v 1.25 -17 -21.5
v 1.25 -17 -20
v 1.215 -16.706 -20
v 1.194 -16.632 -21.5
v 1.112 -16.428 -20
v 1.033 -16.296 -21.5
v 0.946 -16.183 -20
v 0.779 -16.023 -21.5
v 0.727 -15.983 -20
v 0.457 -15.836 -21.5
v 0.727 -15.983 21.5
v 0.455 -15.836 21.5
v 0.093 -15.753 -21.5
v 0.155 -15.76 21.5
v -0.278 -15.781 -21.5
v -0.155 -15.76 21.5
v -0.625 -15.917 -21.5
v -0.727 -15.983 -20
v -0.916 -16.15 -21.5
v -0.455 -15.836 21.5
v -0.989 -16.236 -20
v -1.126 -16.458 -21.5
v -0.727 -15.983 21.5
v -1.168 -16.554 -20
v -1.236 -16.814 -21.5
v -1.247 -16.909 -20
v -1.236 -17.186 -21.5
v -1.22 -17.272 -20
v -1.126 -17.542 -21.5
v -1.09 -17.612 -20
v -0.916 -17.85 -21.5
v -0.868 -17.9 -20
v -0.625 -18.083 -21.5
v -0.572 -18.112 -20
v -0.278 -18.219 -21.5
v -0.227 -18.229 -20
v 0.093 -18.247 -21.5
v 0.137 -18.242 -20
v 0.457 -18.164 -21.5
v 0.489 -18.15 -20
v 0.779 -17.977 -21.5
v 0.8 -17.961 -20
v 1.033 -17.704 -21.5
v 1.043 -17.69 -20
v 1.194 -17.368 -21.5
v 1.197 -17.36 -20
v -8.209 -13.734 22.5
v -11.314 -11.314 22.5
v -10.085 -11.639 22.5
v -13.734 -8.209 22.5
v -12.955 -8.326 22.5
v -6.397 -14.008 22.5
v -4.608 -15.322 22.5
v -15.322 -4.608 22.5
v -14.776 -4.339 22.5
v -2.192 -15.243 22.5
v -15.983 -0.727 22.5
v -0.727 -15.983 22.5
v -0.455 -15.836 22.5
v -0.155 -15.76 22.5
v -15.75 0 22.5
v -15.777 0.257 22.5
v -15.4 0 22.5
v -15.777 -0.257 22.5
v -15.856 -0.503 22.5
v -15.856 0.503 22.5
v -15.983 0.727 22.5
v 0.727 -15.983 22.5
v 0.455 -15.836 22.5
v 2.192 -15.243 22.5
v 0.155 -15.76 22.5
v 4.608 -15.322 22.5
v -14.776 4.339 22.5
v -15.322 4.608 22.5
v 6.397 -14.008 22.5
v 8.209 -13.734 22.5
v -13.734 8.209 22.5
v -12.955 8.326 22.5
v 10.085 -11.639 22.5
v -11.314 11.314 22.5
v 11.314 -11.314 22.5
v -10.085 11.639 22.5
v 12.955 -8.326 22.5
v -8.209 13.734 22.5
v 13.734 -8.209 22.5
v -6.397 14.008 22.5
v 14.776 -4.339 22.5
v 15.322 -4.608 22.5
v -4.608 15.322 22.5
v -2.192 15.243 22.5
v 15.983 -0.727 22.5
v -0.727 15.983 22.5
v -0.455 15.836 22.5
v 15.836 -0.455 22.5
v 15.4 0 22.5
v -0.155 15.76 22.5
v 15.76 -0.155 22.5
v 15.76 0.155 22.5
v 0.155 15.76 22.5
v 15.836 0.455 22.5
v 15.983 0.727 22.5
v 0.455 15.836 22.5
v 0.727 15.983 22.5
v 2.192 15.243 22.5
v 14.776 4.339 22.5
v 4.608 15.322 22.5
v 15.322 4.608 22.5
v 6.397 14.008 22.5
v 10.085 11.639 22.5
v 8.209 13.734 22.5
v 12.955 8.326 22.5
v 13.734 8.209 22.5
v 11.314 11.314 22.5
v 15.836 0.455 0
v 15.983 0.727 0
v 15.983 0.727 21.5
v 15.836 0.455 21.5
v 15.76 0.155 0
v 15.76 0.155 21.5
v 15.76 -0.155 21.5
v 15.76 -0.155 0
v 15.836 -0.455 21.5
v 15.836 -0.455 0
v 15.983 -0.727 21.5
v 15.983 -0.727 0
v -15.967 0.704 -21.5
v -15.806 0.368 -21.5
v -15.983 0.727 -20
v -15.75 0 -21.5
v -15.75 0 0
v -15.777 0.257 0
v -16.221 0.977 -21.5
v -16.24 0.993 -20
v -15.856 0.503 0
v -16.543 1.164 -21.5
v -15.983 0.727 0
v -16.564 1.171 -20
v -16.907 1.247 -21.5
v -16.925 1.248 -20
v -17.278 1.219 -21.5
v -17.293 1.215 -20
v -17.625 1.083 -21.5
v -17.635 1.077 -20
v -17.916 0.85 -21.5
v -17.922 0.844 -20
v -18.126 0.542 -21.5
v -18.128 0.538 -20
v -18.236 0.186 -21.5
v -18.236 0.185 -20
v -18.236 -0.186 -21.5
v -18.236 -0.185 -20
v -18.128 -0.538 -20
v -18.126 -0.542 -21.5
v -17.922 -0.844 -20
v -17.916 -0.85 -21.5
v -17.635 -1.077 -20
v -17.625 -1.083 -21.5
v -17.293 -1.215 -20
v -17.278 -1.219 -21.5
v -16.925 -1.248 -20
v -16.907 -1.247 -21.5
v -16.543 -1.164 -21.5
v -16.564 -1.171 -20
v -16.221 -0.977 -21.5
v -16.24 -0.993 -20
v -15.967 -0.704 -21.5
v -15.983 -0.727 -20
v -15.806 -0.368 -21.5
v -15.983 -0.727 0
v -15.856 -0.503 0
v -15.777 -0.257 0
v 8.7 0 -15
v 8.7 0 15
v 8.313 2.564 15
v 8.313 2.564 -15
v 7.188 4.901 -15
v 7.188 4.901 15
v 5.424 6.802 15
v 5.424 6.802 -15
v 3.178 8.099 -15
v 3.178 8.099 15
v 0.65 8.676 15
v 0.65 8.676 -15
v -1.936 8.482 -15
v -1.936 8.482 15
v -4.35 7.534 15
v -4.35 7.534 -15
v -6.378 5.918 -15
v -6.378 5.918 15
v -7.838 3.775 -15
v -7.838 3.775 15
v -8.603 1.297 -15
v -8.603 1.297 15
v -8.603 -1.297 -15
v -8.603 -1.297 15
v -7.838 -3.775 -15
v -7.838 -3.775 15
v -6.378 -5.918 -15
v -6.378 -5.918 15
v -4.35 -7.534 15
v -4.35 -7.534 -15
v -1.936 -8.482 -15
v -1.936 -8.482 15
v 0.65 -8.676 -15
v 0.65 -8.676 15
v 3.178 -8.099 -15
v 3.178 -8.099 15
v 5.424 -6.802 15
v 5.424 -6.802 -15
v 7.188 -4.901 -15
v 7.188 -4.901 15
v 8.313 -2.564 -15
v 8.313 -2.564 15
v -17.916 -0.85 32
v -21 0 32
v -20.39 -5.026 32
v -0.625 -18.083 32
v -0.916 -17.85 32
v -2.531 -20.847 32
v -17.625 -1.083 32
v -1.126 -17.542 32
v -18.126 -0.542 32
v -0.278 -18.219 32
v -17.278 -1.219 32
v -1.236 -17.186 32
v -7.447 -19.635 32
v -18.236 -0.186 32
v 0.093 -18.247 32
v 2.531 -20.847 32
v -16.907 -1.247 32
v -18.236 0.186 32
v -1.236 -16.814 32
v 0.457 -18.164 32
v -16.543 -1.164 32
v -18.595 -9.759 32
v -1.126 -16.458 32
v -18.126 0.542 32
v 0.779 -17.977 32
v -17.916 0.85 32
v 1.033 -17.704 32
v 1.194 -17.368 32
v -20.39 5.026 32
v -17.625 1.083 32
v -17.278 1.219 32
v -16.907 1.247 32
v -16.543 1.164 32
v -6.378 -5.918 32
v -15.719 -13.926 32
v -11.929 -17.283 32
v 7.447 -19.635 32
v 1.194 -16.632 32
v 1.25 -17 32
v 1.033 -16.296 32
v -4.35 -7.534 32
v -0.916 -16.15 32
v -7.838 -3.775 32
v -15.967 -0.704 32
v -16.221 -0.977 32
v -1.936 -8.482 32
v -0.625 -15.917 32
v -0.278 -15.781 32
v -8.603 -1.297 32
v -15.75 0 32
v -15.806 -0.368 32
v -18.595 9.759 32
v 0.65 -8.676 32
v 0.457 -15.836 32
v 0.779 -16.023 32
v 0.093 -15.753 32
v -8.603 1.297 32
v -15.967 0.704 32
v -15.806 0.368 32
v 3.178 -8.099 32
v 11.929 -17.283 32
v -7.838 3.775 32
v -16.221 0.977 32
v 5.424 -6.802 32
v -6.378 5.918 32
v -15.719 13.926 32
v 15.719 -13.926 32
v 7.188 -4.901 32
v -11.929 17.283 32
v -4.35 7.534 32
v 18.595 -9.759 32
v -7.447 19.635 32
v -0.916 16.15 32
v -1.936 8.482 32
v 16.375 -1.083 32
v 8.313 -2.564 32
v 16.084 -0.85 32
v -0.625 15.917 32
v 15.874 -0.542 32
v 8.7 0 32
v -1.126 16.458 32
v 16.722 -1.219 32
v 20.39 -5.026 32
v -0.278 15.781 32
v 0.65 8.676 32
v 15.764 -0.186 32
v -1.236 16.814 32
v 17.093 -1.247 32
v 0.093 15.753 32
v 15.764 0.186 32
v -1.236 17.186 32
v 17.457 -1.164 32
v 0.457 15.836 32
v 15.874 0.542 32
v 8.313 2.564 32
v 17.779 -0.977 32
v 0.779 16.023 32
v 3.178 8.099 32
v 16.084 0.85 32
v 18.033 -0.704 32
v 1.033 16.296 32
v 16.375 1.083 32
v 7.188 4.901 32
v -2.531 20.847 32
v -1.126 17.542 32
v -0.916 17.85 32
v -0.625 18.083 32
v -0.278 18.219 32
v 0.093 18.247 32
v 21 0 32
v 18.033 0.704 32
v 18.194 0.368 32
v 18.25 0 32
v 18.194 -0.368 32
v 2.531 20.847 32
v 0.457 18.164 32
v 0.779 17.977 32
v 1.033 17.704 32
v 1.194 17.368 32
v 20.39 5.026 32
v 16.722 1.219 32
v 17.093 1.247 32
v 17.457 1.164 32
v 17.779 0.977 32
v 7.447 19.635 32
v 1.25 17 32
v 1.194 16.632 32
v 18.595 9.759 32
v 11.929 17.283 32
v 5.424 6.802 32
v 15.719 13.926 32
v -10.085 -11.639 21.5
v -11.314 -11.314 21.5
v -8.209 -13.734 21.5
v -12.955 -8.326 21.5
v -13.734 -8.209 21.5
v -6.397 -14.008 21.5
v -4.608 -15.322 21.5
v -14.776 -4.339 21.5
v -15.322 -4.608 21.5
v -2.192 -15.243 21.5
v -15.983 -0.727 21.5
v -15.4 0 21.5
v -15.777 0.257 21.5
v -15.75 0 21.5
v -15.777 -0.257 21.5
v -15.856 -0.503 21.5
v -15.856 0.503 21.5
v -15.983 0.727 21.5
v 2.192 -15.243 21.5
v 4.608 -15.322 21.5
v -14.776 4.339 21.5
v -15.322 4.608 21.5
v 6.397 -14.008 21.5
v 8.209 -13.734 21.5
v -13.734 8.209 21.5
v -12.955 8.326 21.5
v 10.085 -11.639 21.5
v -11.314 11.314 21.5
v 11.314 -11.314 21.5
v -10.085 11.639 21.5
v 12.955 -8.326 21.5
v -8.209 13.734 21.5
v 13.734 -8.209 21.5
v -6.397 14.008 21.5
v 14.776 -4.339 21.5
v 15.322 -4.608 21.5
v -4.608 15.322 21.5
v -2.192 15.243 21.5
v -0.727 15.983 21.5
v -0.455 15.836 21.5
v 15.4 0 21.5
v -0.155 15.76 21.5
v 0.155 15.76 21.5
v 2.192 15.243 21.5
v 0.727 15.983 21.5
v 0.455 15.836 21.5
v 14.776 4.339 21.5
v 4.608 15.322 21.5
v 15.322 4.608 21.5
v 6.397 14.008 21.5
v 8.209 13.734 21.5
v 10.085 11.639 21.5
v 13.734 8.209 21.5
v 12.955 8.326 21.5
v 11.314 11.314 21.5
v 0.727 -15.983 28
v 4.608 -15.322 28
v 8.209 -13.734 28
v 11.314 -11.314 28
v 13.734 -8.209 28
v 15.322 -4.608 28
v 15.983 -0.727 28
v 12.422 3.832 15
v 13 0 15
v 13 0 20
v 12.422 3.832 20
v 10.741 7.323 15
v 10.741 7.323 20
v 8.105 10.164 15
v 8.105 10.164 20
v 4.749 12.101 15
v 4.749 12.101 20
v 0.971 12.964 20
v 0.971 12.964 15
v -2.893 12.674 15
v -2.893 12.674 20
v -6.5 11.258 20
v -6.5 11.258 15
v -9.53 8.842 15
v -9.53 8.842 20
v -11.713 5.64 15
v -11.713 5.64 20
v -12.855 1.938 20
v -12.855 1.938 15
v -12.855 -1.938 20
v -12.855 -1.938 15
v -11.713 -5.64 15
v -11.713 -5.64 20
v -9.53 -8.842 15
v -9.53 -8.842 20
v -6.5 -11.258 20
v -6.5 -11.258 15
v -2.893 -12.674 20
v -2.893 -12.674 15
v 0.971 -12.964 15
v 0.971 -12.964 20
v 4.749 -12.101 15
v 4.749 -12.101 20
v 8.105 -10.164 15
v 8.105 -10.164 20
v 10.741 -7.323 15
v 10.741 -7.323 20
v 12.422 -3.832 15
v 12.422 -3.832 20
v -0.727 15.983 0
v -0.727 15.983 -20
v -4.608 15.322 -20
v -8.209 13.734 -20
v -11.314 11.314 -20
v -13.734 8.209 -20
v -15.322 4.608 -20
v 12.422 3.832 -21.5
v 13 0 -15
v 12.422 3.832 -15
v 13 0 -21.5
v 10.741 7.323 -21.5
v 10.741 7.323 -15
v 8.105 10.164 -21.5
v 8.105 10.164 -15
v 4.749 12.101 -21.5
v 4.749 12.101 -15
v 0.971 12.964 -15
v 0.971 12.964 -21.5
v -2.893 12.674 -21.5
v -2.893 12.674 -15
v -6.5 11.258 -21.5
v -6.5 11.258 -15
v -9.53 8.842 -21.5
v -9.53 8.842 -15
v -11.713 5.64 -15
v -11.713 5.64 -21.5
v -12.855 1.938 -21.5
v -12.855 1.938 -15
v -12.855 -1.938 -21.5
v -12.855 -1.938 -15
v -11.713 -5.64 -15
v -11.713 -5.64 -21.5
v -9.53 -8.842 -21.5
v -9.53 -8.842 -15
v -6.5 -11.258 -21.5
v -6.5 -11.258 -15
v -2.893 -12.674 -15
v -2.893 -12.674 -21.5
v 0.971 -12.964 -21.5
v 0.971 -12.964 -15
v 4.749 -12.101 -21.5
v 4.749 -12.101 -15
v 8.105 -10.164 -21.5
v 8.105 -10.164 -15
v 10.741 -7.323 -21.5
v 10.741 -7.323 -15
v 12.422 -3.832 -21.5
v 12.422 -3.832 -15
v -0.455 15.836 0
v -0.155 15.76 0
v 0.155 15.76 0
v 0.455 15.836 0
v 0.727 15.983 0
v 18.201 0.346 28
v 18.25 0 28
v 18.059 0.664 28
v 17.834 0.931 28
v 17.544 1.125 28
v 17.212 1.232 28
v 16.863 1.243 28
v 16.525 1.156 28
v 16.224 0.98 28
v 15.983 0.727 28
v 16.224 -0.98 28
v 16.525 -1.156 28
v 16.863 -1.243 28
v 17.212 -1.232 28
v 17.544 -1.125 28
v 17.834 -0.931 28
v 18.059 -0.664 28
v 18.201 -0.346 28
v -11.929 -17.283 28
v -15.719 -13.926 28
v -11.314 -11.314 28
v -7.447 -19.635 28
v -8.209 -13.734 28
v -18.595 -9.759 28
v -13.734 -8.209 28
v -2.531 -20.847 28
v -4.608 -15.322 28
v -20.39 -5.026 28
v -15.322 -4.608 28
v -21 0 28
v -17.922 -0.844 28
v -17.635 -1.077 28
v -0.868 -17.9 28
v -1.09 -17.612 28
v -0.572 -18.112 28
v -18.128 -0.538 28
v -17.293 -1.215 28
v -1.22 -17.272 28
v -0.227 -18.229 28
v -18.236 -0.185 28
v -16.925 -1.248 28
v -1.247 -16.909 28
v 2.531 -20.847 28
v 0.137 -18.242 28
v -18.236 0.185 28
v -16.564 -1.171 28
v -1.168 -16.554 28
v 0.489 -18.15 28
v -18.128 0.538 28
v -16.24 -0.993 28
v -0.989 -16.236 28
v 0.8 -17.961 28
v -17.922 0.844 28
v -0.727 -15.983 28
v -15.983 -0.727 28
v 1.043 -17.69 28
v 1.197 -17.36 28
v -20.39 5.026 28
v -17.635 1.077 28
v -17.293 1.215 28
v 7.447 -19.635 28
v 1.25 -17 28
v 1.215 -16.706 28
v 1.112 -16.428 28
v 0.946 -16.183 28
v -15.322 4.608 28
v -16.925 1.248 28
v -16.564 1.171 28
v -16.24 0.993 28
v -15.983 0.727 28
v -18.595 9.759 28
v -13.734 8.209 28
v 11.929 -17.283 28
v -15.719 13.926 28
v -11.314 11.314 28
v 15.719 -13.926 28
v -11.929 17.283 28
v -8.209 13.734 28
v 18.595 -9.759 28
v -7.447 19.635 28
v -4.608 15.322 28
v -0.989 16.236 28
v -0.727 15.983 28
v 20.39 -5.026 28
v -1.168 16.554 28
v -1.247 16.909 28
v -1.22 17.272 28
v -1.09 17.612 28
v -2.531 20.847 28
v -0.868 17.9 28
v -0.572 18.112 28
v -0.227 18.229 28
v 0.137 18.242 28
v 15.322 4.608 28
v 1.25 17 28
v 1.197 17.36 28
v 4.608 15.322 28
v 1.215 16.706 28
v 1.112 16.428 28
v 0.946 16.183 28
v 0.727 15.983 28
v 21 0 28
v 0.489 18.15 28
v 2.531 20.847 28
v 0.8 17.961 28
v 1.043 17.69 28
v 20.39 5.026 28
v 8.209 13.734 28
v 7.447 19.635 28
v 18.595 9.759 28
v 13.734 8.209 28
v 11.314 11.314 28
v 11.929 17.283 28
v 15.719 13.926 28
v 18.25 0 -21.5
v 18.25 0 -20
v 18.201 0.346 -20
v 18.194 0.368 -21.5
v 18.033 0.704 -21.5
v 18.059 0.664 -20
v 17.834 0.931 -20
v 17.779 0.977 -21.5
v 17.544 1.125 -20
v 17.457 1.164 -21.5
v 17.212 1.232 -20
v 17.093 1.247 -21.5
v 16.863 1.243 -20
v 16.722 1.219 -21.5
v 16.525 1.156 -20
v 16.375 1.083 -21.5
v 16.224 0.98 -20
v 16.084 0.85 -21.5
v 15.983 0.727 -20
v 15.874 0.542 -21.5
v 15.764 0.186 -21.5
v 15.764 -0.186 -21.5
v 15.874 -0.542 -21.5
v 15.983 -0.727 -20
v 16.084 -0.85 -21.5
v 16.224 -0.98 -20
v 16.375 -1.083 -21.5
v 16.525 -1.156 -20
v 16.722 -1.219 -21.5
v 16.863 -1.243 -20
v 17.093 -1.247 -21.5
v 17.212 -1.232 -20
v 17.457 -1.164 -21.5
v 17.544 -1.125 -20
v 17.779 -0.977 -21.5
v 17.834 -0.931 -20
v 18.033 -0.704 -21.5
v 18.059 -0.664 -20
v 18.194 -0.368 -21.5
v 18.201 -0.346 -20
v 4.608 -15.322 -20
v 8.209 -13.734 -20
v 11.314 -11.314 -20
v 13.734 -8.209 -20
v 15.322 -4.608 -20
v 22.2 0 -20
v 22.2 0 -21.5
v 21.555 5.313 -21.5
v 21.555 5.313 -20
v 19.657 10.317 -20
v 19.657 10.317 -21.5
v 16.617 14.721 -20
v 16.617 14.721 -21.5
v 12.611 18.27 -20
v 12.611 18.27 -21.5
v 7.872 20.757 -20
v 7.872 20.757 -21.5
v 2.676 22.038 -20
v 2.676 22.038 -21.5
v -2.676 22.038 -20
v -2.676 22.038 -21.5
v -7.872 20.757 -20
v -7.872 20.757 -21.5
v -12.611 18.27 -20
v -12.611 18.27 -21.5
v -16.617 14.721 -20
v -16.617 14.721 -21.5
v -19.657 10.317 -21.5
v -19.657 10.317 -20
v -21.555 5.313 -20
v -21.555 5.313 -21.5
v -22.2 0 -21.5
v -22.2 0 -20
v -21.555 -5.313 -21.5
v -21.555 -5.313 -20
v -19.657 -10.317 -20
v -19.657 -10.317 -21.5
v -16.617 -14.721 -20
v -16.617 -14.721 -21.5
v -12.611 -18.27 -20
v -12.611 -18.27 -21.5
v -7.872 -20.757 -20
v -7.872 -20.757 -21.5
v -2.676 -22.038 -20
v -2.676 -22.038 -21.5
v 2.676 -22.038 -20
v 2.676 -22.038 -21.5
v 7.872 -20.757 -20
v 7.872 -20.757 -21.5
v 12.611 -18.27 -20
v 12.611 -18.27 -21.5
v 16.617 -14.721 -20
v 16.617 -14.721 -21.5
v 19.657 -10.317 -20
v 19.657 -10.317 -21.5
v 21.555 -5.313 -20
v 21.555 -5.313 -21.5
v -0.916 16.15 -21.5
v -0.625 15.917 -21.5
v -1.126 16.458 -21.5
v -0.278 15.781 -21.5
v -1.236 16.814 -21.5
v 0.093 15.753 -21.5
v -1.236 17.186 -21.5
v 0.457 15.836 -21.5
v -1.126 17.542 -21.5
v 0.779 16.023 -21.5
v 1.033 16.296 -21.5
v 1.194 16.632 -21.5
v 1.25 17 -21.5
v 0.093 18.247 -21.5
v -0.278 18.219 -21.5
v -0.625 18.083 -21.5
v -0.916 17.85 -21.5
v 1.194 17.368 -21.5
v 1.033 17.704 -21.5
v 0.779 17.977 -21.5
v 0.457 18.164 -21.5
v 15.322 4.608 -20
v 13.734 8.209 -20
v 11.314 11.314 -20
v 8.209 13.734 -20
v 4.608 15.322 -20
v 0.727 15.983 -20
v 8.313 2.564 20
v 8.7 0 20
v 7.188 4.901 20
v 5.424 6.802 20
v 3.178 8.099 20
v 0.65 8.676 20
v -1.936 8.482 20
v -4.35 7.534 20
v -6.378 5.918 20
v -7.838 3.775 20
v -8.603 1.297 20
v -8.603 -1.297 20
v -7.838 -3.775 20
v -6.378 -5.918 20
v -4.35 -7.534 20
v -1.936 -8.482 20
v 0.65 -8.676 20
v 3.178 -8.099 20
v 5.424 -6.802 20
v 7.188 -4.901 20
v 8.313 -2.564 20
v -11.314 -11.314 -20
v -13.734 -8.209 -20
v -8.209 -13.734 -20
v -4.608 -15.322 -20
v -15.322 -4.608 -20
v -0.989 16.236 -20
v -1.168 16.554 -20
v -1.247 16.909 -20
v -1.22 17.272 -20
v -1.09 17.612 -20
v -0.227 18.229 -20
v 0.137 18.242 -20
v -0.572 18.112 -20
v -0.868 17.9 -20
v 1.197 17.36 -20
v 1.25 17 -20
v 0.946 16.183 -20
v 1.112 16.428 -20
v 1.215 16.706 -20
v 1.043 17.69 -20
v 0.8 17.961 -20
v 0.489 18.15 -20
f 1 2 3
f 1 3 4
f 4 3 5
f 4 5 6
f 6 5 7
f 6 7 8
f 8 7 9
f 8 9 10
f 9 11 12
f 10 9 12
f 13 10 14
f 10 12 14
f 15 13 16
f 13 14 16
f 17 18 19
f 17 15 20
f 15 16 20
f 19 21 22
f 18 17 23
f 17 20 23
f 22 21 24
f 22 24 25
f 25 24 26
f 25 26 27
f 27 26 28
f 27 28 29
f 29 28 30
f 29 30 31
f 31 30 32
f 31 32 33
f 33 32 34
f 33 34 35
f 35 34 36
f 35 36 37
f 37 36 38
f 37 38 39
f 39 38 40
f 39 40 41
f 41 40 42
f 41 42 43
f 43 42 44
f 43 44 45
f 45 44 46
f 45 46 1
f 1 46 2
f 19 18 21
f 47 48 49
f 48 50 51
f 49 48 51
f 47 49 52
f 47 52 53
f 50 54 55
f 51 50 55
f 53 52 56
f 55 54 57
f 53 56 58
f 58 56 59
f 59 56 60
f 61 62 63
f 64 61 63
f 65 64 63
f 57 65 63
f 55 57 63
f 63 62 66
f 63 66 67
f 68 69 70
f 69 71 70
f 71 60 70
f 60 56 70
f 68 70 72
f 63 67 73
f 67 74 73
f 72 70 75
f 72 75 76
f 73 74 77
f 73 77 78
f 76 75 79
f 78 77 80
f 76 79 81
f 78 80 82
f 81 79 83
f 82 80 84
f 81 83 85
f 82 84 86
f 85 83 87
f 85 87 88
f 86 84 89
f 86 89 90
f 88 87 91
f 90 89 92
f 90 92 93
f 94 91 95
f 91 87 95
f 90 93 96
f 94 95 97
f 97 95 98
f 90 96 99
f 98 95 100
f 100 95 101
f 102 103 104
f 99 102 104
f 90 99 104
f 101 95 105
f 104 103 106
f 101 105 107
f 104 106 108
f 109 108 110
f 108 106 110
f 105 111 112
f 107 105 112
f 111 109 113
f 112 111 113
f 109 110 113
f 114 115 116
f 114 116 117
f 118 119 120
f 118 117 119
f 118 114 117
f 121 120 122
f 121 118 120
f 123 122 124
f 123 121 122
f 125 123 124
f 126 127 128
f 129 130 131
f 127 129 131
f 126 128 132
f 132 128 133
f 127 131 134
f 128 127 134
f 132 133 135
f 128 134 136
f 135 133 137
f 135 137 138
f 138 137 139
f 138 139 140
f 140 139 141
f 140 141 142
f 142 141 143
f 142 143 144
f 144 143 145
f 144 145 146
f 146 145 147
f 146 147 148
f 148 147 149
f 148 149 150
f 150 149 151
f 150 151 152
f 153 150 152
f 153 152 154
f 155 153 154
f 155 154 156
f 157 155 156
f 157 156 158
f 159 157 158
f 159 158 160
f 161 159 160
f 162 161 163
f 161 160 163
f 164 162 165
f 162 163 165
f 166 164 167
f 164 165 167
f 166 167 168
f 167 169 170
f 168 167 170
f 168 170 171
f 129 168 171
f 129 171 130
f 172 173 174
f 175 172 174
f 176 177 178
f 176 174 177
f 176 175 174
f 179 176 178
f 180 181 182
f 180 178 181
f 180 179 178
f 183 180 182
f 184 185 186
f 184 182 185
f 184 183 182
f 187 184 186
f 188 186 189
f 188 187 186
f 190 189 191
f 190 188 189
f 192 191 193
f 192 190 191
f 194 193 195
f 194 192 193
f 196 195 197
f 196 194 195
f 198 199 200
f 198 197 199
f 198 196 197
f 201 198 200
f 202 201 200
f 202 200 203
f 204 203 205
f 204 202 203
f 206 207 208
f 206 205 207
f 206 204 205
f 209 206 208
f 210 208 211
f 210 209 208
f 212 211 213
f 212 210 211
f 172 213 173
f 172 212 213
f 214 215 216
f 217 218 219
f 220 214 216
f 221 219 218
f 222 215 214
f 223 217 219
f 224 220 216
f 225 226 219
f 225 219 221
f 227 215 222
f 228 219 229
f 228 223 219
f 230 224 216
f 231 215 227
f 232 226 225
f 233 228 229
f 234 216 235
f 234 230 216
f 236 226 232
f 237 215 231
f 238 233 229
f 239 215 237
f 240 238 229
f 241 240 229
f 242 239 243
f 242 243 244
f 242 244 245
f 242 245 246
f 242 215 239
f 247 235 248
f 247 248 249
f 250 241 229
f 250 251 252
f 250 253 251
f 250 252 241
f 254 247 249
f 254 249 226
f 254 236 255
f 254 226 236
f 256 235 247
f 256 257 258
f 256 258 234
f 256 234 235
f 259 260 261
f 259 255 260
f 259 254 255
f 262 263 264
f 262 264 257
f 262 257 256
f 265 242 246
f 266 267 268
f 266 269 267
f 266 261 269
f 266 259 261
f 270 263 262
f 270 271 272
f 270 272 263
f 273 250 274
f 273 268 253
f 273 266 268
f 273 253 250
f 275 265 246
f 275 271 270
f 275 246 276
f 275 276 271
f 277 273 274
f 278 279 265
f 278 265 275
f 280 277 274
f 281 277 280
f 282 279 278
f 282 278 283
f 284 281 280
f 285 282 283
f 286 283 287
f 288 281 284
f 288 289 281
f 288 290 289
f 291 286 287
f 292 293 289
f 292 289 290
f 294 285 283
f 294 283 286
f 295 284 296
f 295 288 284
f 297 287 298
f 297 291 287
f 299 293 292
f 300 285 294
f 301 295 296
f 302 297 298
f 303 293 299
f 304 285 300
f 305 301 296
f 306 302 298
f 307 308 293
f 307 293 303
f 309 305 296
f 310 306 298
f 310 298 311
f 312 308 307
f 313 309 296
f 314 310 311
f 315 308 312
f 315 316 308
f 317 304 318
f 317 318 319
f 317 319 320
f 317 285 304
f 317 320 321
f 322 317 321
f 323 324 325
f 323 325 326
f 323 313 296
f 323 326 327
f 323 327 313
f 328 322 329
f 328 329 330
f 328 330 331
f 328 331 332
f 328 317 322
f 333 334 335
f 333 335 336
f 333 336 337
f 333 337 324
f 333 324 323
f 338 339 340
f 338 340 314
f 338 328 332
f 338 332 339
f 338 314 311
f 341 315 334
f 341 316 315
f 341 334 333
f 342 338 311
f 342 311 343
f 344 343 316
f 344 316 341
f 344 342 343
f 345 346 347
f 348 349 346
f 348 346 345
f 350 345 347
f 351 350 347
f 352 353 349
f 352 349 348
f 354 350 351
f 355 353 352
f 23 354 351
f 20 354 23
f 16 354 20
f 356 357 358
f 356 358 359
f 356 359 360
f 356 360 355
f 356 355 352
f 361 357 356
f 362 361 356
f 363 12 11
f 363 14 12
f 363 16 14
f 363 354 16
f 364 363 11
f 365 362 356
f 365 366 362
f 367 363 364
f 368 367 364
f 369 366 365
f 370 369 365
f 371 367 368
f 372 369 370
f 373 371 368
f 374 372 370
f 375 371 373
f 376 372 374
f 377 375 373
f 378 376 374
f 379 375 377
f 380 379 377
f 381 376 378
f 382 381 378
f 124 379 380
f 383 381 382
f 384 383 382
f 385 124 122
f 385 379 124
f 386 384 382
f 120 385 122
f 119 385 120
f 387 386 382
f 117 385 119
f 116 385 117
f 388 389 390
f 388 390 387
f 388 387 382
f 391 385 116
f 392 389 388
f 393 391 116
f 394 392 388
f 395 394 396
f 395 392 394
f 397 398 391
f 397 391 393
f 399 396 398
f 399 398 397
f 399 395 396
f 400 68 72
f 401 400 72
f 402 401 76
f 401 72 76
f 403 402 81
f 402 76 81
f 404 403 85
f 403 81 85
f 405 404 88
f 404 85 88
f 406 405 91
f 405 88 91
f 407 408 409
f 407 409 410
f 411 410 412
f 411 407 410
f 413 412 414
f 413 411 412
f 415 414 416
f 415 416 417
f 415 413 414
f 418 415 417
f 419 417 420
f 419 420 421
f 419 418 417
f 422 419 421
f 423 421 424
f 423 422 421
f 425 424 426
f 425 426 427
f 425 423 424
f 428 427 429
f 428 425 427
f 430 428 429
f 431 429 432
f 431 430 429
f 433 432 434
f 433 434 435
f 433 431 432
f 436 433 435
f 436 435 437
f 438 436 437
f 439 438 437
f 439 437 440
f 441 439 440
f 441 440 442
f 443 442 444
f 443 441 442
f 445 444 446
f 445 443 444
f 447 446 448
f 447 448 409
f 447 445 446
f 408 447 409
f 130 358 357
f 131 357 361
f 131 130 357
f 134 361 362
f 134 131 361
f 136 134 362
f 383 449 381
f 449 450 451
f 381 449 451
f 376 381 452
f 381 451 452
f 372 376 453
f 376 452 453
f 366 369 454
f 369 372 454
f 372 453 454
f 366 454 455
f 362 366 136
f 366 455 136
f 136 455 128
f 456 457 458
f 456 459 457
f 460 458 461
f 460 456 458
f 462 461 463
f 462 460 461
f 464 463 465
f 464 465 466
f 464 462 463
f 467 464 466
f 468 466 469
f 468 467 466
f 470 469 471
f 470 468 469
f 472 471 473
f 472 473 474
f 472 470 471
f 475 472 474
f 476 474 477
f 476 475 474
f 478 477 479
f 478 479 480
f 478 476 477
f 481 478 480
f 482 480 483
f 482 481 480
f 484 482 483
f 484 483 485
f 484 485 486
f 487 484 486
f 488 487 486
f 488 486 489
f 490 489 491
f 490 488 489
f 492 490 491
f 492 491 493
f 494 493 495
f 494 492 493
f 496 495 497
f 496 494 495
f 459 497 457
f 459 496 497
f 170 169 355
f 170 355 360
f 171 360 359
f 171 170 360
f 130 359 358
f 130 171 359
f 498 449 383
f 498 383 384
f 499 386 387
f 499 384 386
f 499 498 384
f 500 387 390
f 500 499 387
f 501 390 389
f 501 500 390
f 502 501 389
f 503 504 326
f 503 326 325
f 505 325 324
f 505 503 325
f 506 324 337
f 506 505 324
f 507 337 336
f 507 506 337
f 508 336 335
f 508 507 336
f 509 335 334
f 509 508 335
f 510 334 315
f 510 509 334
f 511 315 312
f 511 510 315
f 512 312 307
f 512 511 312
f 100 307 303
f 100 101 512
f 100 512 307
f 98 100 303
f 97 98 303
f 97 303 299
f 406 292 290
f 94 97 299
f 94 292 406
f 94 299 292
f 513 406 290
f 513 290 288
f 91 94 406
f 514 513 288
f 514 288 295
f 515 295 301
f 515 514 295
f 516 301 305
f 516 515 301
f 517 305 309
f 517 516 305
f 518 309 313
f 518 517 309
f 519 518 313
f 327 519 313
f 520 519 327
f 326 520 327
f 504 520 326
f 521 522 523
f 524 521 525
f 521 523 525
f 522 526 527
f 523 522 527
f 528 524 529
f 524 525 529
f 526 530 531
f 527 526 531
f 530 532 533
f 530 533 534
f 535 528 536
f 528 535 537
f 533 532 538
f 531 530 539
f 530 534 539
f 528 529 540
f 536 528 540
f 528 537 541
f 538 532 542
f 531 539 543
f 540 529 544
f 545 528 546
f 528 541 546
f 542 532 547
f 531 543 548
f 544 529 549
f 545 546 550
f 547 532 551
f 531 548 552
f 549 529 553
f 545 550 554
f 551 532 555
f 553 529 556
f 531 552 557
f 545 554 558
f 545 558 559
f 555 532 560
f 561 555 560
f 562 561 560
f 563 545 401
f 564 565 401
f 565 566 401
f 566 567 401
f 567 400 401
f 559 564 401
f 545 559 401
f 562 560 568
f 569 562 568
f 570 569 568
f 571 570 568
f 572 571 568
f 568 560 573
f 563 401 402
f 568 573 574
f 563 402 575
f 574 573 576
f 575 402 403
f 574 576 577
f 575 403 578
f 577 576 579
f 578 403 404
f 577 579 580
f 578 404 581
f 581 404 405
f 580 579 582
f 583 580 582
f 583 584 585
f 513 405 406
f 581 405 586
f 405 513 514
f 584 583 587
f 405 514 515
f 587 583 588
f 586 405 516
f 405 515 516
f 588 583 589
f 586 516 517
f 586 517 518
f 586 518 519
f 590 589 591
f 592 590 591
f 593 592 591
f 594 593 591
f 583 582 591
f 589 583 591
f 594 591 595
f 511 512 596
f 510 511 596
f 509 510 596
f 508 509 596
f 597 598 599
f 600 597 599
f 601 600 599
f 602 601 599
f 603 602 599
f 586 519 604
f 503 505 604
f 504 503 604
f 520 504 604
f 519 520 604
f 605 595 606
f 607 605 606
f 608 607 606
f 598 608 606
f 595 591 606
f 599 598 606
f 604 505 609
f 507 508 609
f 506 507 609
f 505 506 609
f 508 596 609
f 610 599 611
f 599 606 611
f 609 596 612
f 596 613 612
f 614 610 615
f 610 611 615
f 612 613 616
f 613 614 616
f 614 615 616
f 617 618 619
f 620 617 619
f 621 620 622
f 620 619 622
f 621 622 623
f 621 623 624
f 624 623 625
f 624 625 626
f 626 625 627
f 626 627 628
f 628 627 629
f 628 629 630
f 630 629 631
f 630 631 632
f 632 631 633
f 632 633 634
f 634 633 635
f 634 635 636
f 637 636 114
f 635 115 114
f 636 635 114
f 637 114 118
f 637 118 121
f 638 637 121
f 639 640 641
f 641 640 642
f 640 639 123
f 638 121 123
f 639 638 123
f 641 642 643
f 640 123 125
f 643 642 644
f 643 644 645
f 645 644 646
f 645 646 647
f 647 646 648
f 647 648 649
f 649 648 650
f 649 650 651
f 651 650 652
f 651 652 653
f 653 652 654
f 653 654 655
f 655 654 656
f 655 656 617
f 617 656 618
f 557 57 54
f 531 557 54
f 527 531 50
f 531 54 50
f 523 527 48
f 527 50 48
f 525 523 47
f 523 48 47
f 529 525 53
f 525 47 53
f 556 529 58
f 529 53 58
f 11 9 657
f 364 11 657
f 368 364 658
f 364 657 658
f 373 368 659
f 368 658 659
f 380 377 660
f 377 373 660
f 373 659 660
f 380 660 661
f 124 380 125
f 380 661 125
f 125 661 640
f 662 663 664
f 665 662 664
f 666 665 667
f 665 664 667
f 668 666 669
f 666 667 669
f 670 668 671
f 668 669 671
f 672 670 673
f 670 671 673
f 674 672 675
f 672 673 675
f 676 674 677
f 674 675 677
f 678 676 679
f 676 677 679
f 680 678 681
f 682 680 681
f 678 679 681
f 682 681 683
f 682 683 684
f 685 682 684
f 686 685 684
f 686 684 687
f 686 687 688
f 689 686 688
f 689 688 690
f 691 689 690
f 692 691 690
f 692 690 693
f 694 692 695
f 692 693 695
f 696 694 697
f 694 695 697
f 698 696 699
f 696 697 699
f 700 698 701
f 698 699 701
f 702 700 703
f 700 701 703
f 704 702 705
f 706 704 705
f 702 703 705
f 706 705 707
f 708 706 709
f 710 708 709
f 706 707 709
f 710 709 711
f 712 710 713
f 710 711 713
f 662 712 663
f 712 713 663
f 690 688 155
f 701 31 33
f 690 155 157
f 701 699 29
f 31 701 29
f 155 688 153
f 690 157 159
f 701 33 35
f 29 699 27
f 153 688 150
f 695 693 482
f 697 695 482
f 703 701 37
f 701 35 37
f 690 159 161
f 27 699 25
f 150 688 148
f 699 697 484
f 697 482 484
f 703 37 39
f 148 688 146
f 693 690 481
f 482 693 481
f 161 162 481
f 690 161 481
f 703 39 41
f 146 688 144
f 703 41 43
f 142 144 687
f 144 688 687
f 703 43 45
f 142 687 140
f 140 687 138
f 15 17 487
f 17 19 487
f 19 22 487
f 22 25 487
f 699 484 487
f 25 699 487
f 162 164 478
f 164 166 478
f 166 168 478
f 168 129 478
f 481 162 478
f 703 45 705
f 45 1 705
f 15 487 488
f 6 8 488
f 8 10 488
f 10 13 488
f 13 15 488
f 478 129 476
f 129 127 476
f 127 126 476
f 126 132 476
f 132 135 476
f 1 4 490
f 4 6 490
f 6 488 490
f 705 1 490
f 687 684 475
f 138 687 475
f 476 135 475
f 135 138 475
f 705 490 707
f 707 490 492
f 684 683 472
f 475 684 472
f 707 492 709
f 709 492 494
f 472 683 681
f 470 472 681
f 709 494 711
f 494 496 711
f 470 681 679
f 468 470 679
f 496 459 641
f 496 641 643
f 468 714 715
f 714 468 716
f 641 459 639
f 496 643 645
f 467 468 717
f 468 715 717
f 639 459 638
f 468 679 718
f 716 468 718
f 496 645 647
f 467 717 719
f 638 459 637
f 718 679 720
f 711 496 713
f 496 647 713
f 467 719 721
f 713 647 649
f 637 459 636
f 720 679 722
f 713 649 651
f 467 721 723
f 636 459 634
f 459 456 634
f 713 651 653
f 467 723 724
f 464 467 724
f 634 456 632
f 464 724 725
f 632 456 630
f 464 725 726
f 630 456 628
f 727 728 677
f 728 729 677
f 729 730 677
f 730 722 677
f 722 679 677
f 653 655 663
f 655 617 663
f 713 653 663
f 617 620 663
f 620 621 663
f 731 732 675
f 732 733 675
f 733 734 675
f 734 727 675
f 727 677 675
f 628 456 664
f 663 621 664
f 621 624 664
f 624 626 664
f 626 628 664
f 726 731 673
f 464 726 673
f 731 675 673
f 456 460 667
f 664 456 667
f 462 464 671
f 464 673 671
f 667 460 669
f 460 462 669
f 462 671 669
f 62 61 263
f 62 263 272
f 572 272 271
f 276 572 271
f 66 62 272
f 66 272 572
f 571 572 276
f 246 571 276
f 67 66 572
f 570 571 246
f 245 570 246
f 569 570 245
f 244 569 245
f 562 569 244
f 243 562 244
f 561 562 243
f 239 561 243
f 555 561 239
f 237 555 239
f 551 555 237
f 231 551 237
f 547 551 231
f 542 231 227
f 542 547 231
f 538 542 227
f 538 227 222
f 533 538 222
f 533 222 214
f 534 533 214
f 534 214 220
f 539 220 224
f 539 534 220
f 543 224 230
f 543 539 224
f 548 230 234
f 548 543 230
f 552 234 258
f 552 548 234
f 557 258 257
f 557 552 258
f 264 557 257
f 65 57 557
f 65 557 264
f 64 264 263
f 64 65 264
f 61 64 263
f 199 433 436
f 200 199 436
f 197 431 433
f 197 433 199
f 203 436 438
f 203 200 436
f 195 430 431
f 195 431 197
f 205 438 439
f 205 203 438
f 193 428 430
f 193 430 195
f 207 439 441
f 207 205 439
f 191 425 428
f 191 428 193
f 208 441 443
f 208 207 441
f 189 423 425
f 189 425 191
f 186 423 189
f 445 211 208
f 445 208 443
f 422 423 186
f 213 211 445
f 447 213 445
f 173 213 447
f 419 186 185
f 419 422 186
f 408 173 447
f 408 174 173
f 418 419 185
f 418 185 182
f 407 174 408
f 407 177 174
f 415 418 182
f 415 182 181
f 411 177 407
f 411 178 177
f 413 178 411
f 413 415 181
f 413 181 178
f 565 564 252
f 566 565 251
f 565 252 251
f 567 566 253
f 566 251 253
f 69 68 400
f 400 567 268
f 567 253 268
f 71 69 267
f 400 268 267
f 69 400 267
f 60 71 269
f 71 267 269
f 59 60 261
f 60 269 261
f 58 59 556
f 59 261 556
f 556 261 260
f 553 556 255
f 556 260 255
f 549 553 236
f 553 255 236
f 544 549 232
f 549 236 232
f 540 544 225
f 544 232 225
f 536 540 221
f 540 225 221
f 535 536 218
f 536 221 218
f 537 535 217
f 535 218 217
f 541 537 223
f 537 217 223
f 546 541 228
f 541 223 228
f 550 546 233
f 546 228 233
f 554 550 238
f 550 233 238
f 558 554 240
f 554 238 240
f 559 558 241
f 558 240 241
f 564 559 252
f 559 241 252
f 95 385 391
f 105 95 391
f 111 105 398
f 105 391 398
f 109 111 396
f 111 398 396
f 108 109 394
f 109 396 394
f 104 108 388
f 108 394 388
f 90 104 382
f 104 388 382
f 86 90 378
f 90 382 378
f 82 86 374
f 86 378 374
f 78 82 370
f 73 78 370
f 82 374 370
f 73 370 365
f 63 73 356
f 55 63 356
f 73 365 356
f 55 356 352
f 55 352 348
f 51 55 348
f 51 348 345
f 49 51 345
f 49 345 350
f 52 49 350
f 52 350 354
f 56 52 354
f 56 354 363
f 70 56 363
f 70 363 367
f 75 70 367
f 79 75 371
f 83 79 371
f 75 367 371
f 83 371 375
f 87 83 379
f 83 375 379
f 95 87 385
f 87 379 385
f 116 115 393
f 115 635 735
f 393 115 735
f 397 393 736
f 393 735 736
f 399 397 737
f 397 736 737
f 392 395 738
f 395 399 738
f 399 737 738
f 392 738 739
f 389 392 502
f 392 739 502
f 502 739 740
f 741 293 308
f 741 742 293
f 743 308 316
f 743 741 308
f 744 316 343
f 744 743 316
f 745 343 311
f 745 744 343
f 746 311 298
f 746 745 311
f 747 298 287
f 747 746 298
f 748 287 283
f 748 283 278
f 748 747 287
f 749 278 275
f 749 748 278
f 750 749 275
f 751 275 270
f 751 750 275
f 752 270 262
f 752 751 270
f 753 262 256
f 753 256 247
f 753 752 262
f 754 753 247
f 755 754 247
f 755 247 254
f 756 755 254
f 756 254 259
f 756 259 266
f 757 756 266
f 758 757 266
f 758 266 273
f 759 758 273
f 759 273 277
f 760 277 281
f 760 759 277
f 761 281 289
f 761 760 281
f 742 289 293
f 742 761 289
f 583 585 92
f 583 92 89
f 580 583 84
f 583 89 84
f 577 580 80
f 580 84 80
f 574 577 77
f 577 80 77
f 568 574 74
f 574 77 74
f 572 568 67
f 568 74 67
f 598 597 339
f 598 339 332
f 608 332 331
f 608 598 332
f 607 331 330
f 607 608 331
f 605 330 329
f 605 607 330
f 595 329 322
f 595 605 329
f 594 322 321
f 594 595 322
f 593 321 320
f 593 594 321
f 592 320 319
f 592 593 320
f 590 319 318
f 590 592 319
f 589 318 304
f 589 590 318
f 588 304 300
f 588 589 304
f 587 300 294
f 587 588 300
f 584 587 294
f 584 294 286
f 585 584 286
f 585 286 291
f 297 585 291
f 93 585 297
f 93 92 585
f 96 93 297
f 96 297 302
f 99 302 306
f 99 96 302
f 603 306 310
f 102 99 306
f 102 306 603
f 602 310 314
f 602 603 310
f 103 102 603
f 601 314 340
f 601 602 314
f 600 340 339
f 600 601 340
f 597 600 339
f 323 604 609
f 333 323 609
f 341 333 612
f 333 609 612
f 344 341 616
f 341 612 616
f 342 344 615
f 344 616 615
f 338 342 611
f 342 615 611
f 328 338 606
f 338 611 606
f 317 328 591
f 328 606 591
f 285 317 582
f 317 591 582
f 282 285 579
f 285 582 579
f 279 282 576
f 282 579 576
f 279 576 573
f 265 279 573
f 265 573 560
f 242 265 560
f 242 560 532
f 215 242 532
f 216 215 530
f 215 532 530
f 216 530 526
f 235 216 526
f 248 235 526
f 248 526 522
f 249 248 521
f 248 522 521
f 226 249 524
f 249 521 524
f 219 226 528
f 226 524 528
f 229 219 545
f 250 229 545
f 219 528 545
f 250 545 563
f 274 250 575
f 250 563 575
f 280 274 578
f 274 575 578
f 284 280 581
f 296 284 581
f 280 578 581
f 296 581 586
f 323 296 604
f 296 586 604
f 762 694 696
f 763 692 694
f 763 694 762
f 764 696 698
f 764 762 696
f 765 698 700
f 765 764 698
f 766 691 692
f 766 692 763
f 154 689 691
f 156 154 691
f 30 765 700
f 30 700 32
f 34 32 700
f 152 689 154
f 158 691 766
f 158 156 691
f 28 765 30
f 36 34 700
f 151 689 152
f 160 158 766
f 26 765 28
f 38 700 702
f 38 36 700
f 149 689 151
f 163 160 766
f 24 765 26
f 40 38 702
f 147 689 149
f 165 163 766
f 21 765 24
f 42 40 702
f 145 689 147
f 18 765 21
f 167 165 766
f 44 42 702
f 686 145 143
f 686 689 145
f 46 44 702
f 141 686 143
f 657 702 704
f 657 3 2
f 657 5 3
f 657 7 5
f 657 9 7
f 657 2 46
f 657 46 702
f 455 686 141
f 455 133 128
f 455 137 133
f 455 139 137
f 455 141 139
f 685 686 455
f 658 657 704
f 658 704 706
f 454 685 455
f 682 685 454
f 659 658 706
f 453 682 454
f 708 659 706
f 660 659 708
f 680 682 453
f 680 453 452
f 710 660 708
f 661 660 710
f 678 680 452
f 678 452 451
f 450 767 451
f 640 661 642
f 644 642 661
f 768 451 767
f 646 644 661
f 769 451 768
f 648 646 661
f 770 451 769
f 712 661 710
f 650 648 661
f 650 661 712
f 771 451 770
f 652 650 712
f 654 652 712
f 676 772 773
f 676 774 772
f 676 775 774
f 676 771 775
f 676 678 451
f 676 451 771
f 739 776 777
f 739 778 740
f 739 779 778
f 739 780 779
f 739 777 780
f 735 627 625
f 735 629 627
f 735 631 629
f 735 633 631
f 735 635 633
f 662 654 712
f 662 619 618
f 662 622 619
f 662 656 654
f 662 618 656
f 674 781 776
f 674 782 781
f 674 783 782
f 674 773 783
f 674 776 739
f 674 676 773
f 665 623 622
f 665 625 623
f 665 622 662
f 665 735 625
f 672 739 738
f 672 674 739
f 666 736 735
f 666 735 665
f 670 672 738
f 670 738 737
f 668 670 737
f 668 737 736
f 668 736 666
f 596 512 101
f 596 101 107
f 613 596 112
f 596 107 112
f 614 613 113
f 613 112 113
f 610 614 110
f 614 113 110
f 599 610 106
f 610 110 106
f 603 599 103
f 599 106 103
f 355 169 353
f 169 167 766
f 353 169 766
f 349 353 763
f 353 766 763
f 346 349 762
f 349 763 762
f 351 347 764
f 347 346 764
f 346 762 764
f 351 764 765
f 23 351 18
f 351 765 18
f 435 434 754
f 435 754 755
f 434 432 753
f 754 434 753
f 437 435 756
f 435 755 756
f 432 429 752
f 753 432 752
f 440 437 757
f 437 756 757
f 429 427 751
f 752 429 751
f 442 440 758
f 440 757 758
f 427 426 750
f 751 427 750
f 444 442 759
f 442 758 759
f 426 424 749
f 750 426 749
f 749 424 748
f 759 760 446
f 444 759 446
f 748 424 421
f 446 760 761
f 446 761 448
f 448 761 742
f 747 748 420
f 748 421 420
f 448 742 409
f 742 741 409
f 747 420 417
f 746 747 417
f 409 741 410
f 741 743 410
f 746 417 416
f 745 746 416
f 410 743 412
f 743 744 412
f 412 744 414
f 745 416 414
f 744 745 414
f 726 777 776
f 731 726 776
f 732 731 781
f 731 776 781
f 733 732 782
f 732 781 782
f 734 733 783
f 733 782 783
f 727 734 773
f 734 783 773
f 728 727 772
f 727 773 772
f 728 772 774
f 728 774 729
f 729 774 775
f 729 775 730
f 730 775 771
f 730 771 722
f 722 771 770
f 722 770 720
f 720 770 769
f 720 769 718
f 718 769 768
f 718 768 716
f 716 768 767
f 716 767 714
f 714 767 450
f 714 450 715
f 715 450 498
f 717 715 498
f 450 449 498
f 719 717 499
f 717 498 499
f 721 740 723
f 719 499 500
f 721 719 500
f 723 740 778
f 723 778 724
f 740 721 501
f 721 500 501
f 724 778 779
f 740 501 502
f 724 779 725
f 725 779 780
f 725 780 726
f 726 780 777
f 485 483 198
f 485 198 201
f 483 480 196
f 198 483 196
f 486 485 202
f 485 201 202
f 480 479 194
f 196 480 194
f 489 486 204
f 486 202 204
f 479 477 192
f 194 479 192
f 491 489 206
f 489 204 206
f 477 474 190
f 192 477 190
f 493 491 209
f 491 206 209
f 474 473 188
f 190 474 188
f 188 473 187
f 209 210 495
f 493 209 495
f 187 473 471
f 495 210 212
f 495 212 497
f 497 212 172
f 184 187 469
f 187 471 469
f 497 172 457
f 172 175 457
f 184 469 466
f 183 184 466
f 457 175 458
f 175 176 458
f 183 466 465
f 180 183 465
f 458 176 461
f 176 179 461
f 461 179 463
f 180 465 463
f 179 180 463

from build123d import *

# Parameters (mm, degrees)
HOLLOW_HUB_START               = -20
SKETCH_1_R                     = 16
SKETCH_1_R_2                   = 8.7
HOLLOW_HUB_DEPTH               = 48
REAR_STACK_FLANGE_START        = -21.5
SKETCH_2_R                     = 22.2
SKETCH_2_R_2                   = 13
REAR_STACK_FLANGE_DEPTH        = 1.5
SUN_MOUNT_FLANGE_START         = 28
SKETCH_3_R                     = 21
SKETCH_3_R_2                   = 8.7
SUN_MOUNT_FLANGE_DEPTH         = 4
REAR_ROTOR_BEARING_SEAT_START  = -20
SKETCH_4_R                     = 13
REAR_ROTOR_BEARING_SEAT_DEPTH  = 5
FRONT_ROTOR_BEARING_SEAT_START = 15
SKETCH_5_R                     = 13
FRONT_ROTOR_BEARING_SEAT_DEPTH = 5
CIRCLIP_GROOVE_START           = 21.5
SKETCH_6_R                     = 17
SKETCH_6_R_2                   = 15.4
CIRCLIP_GROOVE_DEPTH           = 1
SKETCH_7_R                     = 1.25
THROUGH_HOLES_DEPTH            = 100


with BuildPart() as part:
    # Эскиз1 → Hollow_hub (new body)
    with BuildSketch(Plane.XY.offset(HOLLOW_HUB_START)):
        Circle(SKETCH_1_R)
        Circle(SKETCH_1_R_2, mode=Mode.SUBTRACT)
    extrude(amount=HOLLOW_HUB_DEPTH)

    # Эскиз2 → Rear_stack_flange (add)
    with BuildSketch(Plane.XY.offset(REAR_STACK_FLANGE_START)):
        Circle(SKETCH_2_R)
        Circle(SKETCH_2_R_2, mode=Mode.SUBTRACT)
    extrude(amount=REAR_STACK_FLANGE_DEPTH)

    # Эскиз3 → Sun_mount_flange (add)
    with BuildSketch(Plane.XY.offset(SUN_MOUNT_FLANGE_START)):
        Circle(SKETCH_3_R)
        Circle(SKETCH_3_R_2, mode=Mode.SUBTRACT)
    extrude(amount=SUN_MOUNT_FLANGE_DEPTH)

    # Эскиз4 → Rear_rotor_bearing_seat (cut)
    with BuildSketch(Plane.XY.offset(REAR_ROTOR_BEARING_SEAT_START)):
        Circle(SKETCH_4_R)
    extrude(amount=REAR_ROTOR_BEARING_SEAT_DEPTH, mode=Mode.SUBTRACT)

    # Эскиз5 → Front_rotor_bearing_seat (cut)
    with BuildSketch(Plane.XY.offset(FRONT_ROTOR_BEARING_SEAT_START)):
        Circle(SKETCH_5_R)
    extrude(amount=FRONT_ROTOR_BEARING_SEAT_DEPTH, mode=Mode.SUBTRACT)

    # Эскиз6 → Circlip_groove (cut)
    with BuildSketch(Plane.XY.offset(CIRCLIP_GROOVE_START)):
        Circle(SKETCH_6_R)
        Circle(SKETCH_6_R_2, mode=Mode.SUBTRACT)
    extrude(amount=CIRCLIP_GROOVE_DEPTH, mode=Mode.SUBTRACT)

    # Эскиз7 → Through_holes (cut, symmetric)
    with BuildSketch(Plane.XY):
        with Locations((17, 0)):
            Circle(SKETCH_7_R)
        with Locations((0, 17)):
            Circle(SKETCH_7_R)
        with Locations((-17, 0)):
            Circle(SKETCH_7_R)
        with Locations((0, -17)):
            Circle(SKETCH_7_R)
    extrude(amount=THROUGH_HOLES_DEPTH, both=True, mode=Mode.SUBTRACT)


solid = part.part
